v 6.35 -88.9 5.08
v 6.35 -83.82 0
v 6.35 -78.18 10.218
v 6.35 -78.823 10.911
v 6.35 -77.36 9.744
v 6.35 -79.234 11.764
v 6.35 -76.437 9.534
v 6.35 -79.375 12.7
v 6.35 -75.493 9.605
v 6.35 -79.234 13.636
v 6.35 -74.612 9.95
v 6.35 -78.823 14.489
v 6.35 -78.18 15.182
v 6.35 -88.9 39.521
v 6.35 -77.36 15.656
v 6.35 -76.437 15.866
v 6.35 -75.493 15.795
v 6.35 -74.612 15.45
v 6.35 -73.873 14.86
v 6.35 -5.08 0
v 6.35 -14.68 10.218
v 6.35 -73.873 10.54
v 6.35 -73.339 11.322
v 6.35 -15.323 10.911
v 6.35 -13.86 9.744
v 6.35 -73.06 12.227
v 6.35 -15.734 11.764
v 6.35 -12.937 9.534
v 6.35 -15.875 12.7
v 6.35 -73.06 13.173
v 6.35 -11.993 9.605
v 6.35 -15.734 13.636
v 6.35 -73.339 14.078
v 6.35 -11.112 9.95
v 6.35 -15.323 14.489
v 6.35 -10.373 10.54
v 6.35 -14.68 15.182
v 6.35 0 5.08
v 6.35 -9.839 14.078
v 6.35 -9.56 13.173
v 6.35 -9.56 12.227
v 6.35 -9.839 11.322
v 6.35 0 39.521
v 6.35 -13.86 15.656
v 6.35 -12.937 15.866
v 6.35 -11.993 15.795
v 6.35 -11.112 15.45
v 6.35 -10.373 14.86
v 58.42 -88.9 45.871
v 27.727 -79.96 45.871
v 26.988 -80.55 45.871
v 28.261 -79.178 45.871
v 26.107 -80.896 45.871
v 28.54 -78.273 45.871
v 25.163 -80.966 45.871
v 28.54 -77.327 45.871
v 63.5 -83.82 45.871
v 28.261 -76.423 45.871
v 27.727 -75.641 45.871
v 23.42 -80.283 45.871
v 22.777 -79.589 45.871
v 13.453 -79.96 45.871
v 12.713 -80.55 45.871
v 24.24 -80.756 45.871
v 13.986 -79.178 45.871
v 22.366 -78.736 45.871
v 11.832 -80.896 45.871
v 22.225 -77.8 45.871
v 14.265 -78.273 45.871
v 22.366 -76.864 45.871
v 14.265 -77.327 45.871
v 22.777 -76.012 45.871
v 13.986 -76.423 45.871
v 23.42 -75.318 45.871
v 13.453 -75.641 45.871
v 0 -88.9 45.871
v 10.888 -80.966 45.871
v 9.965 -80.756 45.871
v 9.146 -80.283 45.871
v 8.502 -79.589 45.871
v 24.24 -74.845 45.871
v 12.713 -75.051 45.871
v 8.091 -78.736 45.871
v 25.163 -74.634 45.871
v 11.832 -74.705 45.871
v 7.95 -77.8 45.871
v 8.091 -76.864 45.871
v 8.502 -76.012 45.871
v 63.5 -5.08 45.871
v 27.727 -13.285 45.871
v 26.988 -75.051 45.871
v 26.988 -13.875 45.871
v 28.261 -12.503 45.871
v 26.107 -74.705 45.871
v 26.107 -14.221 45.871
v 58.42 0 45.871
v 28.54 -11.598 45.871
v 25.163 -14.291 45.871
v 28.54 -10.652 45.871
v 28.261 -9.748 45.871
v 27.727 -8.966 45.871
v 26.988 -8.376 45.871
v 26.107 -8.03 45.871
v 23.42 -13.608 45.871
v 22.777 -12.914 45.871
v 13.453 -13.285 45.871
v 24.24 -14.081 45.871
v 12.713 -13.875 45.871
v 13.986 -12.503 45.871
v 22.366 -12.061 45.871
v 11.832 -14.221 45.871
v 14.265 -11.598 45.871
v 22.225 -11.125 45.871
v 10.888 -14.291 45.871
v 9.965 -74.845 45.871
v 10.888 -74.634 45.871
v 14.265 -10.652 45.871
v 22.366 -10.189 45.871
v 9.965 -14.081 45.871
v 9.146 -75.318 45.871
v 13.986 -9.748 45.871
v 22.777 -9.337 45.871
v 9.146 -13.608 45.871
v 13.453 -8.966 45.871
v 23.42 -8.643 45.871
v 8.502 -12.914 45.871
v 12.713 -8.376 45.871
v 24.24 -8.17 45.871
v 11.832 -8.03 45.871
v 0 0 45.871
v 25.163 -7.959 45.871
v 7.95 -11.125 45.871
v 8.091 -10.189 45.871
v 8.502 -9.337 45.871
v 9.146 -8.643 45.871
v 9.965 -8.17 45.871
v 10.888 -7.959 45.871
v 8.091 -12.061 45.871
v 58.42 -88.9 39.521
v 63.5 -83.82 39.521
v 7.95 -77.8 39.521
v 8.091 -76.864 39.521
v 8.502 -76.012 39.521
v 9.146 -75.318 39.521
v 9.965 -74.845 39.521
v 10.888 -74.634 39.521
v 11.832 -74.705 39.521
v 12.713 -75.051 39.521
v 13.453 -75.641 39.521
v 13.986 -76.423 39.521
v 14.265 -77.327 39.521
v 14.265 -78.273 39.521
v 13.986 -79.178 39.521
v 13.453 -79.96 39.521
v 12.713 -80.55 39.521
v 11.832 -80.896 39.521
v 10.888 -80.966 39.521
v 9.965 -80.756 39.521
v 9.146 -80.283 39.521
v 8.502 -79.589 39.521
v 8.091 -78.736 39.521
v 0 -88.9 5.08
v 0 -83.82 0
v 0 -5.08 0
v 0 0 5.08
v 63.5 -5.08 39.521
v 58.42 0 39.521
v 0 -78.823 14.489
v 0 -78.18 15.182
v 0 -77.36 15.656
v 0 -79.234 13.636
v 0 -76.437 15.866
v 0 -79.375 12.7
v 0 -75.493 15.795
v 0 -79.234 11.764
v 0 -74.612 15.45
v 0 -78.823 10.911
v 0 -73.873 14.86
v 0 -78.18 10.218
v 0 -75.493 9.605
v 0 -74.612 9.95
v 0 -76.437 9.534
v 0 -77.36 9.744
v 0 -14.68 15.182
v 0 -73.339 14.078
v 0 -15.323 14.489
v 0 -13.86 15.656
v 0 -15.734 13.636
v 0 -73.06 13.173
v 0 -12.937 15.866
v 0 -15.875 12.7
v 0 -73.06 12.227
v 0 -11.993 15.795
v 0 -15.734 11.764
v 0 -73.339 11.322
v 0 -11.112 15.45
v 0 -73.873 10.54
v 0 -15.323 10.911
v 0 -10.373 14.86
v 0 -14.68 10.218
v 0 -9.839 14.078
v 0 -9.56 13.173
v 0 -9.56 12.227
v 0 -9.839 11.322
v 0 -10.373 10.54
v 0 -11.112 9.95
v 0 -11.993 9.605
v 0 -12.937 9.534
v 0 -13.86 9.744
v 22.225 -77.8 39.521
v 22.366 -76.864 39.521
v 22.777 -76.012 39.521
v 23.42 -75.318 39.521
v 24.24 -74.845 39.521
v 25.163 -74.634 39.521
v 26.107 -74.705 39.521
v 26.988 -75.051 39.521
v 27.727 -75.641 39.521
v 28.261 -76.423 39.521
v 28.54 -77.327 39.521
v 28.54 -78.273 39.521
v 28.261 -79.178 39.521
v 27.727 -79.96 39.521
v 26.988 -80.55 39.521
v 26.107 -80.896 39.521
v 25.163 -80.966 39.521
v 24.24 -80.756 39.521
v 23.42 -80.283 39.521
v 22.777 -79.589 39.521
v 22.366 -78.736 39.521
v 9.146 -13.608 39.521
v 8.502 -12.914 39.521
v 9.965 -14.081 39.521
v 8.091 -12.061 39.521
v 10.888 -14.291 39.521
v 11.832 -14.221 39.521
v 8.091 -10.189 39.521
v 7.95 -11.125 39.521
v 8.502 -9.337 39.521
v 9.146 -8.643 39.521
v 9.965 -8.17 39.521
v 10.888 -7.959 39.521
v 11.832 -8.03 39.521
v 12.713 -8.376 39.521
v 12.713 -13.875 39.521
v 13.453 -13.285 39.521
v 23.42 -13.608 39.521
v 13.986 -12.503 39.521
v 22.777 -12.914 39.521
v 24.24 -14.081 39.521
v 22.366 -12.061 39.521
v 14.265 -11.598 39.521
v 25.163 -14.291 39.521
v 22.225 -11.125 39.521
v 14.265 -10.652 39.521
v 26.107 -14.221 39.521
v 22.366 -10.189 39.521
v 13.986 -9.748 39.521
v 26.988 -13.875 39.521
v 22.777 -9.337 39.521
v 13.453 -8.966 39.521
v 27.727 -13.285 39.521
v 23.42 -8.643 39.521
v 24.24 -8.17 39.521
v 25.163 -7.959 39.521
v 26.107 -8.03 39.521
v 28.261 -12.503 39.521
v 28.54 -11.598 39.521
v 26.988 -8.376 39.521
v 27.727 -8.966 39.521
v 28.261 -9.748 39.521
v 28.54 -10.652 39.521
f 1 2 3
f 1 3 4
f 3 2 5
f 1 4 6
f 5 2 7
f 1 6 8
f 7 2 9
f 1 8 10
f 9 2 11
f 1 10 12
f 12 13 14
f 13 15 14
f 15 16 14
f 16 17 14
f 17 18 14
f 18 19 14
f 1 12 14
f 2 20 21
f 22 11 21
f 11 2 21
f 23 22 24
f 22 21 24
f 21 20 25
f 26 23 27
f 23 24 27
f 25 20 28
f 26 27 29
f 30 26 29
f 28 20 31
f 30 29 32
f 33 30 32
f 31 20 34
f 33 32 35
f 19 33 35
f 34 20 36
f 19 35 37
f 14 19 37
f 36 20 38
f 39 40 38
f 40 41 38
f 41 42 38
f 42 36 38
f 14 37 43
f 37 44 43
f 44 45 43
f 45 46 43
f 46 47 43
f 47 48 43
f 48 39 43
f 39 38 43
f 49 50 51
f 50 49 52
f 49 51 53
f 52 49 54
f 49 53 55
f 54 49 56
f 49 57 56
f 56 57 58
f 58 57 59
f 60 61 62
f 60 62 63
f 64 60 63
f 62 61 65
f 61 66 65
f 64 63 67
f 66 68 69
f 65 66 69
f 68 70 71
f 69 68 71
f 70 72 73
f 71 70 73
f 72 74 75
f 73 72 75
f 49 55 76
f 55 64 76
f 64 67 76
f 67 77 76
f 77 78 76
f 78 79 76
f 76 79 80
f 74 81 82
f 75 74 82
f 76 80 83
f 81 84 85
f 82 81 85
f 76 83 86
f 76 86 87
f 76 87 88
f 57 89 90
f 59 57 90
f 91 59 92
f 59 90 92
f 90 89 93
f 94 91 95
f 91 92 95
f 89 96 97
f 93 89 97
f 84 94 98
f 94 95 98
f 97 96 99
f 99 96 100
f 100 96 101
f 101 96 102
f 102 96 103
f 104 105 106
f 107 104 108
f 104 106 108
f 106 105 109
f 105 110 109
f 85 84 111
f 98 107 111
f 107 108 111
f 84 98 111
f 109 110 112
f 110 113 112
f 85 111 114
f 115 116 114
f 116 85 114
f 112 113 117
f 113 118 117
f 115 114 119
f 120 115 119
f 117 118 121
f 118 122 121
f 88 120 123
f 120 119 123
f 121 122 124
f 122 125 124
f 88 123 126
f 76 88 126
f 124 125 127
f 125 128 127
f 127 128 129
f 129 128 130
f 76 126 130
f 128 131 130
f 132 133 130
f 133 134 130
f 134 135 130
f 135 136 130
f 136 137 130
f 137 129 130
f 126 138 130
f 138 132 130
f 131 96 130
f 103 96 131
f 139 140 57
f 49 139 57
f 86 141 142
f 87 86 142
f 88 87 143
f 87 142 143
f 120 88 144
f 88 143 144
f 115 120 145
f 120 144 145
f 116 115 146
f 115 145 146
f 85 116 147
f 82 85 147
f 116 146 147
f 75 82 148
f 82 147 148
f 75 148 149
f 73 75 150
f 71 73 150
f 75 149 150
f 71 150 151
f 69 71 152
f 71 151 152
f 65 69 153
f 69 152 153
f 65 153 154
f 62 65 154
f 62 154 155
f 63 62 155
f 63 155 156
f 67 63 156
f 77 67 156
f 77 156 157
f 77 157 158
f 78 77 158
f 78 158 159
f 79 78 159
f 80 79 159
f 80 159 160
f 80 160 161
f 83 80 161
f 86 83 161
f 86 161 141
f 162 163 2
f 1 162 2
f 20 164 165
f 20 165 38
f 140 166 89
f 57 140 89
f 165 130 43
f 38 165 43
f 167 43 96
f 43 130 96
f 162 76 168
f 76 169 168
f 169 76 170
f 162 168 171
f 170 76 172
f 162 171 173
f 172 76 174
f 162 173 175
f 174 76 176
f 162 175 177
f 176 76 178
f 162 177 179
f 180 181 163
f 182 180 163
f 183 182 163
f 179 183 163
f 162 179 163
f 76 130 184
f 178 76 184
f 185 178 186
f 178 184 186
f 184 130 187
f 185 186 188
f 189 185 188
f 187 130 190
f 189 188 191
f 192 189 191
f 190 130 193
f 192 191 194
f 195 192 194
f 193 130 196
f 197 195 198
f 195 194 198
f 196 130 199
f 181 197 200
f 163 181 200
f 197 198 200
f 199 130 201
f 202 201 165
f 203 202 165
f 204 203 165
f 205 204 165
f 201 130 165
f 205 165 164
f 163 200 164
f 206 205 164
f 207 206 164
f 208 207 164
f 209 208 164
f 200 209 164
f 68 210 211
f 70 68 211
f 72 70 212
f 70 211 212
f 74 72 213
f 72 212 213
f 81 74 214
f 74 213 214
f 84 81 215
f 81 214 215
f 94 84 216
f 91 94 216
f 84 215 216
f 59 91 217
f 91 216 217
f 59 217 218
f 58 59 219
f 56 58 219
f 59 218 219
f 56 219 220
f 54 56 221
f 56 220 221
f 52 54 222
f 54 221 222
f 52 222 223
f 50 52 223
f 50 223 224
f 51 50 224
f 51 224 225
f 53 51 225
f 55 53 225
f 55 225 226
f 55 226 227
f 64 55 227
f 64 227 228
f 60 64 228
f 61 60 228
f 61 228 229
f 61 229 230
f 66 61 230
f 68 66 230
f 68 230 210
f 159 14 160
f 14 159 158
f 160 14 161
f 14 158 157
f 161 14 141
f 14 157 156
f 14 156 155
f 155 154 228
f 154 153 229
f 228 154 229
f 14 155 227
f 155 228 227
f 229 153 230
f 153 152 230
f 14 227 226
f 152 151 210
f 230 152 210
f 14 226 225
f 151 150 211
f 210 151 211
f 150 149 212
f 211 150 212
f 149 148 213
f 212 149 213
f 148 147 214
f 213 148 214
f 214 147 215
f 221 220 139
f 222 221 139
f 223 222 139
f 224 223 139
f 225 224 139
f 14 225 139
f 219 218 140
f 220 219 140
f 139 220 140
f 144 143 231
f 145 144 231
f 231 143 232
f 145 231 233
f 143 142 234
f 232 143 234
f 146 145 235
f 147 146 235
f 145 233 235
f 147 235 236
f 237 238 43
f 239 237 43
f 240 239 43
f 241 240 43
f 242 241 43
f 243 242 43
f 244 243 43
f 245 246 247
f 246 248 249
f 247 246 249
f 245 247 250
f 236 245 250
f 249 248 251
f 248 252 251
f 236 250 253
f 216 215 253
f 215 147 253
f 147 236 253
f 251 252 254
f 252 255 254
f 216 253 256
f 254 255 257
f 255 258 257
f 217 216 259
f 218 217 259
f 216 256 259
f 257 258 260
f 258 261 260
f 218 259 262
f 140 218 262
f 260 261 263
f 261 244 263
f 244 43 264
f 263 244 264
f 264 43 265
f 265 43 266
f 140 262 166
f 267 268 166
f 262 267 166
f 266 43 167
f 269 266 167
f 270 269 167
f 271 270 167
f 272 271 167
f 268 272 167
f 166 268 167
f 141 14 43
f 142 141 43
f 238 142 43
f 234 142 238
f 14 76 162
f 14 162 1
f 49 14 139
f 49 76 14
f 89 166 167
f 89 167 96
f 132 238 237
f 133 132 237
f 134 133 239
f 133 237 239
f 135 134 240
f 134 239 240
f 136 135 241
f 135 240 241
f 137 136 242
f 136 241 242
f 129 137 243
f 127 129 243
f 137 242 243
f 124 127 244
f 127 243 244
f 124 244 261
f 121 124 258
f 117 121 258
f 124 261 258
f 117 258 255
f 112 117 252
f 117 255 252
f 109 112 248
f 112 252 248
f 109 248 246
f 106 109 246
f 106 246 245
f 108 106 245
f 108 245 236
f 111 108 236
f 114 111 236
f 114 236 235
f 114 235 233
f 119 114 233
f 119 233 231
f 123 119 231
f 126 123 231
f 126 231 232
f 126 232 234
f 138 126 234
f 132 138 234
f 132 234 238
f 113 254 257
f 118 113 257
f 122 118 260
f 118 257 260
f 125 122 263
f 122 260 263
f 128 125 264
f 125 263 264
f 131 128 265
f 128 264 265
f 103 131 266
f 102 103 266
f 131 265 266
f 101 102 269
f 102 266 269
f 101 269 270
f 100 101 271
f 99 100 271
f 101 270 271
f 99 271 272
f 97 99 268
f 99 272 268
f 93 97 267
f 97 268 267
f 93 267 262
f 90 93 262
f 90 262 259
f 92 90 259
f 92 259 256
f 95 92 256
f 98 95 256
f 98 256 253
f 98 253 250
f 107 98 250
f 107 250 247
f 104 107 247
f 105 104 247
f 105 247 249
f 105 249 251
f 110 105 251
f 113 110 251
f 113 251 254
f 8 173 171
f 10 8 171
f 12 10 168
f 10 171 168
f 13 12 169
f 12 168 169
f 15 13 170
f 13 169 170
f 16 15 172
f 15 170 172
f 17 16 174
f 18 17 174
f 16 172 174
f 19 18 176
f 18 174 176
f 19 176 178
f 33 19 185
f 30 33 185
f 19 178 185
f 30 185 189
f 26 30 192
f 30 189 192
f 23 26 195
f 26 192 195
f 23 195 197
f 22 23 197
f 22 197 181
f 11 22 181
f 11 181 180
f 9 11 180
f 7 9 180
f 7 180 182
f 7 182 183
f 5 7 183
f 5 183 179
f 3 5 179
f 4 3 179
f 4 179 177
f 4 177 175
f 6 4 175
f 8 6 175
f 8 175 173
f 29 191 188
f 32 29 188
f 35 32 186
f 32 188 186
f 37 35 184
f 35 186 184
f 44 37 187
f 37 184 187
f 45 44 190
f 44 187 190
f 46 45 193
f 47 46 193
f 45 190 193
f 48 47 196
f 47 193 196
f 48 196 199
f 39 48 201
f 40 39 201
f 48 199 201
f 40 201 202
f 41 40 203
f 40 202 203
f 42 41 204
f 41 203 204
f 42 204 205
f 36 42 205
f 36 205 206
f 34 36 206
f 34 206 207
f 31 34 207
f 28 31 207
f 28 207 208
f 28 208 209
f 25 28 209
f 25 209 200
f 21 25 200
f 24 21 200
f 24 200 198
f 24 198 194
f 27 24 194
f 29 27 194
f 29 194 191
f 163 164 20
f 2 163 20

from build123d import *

# Parameters (mm, degrees)
F1_DEPTH = 88.9
F3_D     = 6.35
F4_SIZE  = 5.08
F6_D     = 6.35


with BuildPart() as f1:
    # F0 (on Front) → F1 (new body)
    with BuildSketch(Plane.XZ):
        Polygon((0, 45.871365), (0, 0), (6.35, 0), (6.35, 39.521365), (63.5, 39.521365), (63.5, 45.871365), align=None)
    extrude(amount=F1_DEPTH)

    # F3 (through all)
    with Locations(Plane.YZ.offset(6.35)):
        with Locations((-76.2, 12.7), (-12.7, 12.7)):
            Hole(F3_D / 2)

    # F4
    f4_edges = [f1.edges().sort_by_distance(p)[0] for p in [
        (3.175, 0, 0),
        (3.175, -88.9, 0),
        (63.5, -88.9, 42.696365),
        (63.5, 0, 42.696365),
    ]]
    chamfer(f4_edges, length=F4_SIZE)

    # F6 (through all)
    with Locations(Plane.XY.offset(45.871365)):
        with Locations((11.1252, -11.1252), (25.4, -11.1252), (25.4, -77.8002), (11.1252, -77.8002)):
            Hole(F6_D / 2)


solid = f1.part
